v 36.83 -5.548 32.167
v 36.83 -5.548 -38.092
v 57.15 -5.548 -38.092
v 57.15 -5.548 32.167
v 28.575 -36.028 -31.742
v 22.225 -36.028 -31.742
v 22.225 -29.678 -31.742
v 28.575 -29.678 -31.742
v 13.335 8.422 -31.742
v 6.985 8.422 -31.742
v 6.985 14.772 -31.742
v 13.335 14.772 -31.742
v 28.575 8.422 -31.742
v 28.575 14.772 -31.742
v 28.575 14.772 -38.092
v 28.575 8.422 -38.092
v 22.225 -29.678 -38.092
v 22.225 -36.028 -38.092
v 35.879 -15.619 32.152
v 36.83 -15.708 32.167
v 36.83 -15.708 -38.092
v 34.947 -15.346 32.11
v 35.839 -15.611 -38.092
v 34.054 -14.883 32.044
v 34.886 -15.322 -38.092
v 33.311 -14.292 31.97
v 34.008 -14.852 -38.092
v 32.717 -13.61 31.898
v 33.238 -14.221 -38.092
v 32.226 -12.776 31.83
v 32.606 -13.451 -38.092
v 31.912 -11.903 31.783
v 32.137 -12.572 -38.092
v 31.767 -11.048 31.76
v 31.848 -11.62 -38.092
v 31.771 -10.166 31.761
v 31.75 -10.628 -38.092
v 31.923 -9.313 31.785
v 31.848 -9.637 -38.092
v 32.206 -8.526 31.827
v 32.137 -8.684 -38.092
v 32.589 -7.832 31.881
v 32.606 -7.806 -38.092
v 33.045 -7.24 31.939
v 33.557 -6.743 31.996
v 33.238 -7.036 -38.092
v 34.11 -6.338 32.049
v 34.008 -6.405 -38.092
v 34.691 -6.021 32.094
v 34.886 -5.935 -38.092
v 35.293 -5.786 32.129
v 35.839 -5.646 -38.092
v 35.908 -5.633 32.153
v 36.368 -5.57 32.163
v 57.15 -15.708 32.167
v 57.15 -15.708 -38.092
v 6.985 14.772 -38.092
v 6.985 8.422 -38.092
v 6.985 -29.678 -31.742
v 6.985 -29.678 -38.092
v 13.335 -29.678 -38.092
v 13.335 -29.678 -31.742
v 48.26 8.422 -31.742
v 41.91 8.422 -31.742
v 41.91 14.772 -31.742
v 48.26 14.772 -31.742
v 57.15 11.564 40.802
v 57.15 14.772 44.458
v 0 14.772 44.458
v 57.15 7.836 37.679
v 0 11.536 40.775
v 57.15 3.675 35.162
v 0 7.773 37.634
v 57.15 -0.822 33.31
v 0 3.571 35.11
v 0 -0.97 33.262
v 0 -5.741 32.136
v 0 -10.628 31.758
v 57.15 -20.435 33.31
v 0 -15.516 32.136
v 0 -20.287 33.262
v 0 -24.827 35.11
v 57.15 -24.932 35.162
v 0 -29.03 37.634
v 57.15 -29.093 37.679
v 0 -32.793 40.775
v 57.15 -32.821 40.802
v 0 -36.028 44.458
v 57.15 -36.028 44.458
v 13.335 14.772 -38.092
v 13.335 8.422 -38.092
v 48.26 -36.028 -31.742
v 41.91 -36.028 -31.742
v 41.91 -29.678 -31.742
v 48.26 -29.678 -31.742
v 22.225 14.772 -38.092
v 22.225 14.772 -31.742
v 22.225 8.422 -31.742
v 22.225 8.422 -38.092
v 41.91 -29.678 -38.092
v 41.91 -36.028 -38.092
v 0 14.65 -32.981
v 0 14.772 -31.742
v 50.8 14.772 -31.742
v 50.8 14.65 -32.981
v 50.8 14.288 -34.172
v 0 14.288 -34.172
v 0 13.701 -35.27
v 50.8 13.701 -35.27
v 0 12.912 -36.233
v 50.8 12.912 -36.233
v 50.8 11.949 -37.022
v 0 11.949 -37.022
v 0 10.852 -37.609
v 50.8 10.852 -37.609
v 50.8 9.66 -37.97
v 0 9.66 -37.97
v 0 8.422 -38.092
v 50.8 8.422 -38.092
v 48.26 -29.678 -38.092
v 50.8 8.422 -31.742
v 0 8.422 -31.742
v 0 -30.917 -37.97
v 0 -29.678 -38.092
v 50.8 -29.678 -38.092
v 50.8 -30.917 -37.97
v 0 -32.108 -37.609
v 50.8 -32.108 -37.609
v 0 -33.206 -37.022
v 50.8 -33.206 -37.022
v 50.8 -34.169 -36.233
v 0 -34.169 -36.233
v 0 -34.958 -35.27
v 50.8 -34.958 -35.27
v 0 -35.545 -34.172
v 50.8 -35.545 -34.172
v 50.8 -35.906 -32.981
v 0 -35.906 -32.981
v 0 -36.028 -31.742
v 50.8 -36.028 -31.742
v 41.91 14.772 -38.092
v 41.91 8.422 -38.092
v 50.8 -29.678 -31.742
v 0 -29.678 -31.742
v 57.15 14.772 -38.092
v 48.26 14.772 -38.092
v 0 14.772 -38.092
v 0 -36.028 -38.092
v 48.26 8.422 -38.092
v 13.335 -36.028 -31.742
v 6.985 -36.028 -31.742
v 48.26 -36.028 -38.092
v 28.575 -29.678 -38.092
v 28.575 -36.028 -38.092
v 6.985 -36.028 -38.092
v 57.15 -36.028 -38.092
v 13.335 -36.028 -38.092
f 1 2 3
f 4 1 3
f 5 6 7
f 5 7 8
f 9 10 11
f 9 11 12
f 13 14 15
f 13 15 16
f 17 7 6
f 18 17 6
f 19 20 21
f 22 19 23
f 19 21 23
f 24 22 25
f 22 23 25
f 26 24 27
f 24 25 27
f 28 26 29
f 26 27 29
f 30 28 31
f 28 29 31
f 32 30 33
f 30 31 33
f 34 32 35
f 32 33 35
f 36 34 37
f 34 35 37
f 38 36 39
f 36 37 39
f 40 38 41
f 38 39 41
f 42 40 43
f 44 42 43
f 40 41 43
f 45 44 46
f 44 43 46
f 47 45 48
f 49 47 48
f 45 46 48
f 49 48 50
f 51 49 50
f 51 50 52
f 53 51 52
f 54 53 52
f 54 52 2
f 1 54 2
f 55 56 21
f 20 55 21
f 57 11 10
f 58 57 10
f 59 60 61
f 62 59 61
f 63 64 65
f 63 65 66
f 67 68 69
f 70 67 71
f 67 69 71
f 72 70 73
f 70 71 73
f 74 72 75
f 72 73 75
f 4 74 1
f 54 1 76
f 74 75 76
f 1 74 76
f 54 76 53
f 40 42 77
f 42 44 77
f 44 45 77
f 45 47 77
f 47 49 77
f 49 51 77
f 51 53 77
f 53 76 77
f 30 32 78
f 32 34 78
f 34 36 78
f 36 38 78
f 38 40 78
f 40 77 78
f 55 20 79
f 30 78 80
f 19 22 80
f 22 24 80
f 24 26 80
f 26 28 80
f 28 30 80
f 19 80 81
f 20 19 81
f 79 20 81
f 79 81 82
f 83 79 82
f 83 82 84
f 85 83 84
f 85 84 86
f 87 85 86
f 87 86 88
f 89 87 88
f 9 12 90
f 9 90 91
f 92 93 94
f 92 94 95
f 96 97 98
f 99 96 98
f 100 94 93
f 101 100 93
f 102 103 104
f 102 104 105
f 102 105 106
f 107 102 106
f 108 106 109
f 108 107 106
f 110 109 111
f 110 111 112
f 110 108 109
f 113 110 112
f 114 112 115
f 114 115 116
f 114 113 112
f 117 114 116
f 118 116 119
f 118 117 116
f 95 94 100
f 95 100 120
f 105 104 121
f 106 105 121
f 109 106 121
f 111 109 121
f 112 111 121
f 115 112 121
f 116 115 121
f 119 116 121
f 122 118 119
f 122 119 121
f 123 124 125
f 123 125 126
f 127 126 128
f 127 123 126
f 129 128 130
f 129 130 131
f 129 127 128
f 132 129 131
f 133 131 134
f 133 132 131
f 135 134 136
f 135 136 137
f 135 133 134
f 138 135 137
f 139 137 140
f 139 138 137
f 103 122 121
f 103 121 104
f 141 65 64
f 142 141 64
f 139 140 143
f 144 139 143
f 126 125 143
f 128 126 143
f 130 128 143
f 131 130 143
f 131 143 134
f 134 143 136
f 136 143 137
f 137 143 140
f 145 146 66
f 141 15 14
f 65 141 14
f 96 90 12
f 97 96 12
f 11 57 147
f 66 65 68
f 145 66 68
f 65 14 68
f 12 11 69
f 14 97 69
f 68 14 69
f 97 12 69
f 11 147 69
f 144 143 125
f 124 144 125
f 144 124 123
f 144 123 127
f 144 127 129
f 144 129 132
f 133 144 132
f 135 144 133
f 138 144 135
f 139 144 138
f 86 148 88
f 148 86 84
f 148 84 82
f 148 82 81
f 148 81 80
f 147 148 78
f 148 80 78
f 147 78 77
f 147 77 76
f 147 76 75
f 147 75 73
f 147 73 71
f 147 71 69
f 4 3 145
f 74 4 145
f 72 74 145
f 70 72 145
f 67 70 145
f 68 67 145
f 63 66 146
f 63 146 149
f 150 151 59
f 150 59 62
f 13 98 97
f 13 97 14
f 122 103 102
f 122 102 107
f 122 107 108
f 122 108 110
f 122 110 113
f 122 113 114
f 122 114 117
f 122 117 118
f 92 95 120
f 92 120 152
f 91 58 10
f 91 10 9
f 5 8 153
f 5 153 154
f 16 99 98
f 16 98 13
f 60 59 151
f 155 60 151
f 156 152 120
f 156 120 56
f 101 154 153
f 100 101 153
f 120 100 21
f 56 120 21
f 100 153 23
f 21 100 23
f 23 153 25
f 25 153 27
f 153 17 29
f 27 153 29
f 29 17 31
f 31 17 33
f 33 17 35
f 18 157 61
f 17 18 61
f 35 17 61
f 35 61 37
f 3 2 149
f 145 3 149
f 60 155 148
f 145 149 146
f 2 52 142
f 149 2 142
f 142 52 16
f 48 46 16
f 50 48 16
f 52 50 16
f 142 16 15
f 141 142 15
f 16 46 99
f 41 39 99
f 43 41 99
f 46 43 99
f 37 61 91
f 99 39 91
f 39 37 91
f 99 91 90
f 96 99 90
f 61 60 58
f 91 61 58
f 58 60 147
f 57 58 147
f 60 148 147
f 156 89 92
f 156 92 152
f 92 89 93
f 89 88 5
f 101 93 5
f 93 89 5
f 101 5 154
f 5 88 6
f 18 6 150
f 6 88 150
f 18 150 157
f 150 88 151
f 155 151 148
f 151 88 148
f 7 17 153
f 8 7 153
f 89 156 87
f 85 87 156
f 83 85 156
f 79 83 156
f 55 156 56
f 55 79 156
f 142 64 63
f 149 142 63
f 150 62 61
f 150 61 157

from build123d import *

# Parameters (mm, degrees)
F1_DEPTH = 57.15
F4_DEPTH = 101.6
F5_W     = 6.35
F5_H     = 6.35
F6_DEPTH = 6.35
F8_DEPTH = 50.8


with BuildPart() as f1:
    # F0 (on Right) → F1 (new body)
    with BuildSketch(Plane.YZ):
        with BuildLine():
            Line((-36.028456, 44.457605), (-36.028456, -38.092395))
            Line((-36.028456, -38.092395), (14.771544, -38.092395))
            Line((14.771544, -38.092395), (14.771544, 44.457605))
            ThreePointArc((14.771544, 44.457605), (-10.628456, 31.757605), (-36.028456, 44.457605))
        make_face()
    extrude(amount=F1_DEPTH)

    # F3 (on face) → F4 (cut)
    with BuildSketch(Plane(origin=(0, 0, -38.092395), x_dir=(1, 0, 0), z_dir=(0, 0, -1))):
        with BuildLine():
            Line((57.15, 5.548456), (57.15, 15.708456))
            Line((57.15, 15.708456), (36.83, 15.708456))
            ThreePointArc((36.83, 15.708456), (31.75, 10.628456), (36.83, 5.548456))
            Line((36.83, 5.548456), (57.15, 5.548456))
        make_face()
    extrude(amount=-F4_DEPTH, mode=Mode.SUBTRACT)

    # F5 (on face) → F6 (cut)
    with BuildSketch(Plane(origin=(0, 0, -38.092395), x_dir=(1, 0, 0), z_dir=(0, 0, -1))):
        with Locations((45.085, 32.853456)):
            Rectangle(F5_W, F5_H)
        with Locations((25.4, 32.853456)):
            Rectangle(F5_W, F5_H)
        with Locations((25.4, -11.596544)):
            Rectangle(F5_W, F5_H)
        with Locations((45.085, -11.596544)):
            Rectangle(F5_W, F5_H)
        with Locations((10.16, 32.853456)):
            Rectangle(F5_W, F5_H)
        with Locations((10.16, -11.596544)):
            Rectangle(F5_W, F5_H)
    extrude(amount=-F6_DEPTH, mode=Mode.SUBTRACT)


with BuildPart() as f8:
    # F7 (on face) → F8 (new body)
    with BuildSketch(Plane(origin=(0, 0, 0), x_dir=(0, -1, 0), z_dir=(-1, 0, 0))):
        with BuildLine():
            ThreePointArc((29.678456, -38.092395), (34.168584, -36.232523), (36.028456, -31.742395))
            Line((36.028456, -31.742395), (29.678456, -31.742395))
            Line((29.678456, -31.742395), (29.678456, -38.092395))
        make_face()
        with BuildLine():
            Line((-8.421544, -31.742395), (-14.771544, -31.742395))
            ThreePointArc((-14.771544, -31.742395), (-12.911672, -36.232523), (-8.421544, -38.092395))
            Line((-8.421544, -38.092395), (-8.421544, -31.742395))
        make_face()
    extrude(amount=-F8_DEPTH)


solid = Compound([f1.part, f8.part])
